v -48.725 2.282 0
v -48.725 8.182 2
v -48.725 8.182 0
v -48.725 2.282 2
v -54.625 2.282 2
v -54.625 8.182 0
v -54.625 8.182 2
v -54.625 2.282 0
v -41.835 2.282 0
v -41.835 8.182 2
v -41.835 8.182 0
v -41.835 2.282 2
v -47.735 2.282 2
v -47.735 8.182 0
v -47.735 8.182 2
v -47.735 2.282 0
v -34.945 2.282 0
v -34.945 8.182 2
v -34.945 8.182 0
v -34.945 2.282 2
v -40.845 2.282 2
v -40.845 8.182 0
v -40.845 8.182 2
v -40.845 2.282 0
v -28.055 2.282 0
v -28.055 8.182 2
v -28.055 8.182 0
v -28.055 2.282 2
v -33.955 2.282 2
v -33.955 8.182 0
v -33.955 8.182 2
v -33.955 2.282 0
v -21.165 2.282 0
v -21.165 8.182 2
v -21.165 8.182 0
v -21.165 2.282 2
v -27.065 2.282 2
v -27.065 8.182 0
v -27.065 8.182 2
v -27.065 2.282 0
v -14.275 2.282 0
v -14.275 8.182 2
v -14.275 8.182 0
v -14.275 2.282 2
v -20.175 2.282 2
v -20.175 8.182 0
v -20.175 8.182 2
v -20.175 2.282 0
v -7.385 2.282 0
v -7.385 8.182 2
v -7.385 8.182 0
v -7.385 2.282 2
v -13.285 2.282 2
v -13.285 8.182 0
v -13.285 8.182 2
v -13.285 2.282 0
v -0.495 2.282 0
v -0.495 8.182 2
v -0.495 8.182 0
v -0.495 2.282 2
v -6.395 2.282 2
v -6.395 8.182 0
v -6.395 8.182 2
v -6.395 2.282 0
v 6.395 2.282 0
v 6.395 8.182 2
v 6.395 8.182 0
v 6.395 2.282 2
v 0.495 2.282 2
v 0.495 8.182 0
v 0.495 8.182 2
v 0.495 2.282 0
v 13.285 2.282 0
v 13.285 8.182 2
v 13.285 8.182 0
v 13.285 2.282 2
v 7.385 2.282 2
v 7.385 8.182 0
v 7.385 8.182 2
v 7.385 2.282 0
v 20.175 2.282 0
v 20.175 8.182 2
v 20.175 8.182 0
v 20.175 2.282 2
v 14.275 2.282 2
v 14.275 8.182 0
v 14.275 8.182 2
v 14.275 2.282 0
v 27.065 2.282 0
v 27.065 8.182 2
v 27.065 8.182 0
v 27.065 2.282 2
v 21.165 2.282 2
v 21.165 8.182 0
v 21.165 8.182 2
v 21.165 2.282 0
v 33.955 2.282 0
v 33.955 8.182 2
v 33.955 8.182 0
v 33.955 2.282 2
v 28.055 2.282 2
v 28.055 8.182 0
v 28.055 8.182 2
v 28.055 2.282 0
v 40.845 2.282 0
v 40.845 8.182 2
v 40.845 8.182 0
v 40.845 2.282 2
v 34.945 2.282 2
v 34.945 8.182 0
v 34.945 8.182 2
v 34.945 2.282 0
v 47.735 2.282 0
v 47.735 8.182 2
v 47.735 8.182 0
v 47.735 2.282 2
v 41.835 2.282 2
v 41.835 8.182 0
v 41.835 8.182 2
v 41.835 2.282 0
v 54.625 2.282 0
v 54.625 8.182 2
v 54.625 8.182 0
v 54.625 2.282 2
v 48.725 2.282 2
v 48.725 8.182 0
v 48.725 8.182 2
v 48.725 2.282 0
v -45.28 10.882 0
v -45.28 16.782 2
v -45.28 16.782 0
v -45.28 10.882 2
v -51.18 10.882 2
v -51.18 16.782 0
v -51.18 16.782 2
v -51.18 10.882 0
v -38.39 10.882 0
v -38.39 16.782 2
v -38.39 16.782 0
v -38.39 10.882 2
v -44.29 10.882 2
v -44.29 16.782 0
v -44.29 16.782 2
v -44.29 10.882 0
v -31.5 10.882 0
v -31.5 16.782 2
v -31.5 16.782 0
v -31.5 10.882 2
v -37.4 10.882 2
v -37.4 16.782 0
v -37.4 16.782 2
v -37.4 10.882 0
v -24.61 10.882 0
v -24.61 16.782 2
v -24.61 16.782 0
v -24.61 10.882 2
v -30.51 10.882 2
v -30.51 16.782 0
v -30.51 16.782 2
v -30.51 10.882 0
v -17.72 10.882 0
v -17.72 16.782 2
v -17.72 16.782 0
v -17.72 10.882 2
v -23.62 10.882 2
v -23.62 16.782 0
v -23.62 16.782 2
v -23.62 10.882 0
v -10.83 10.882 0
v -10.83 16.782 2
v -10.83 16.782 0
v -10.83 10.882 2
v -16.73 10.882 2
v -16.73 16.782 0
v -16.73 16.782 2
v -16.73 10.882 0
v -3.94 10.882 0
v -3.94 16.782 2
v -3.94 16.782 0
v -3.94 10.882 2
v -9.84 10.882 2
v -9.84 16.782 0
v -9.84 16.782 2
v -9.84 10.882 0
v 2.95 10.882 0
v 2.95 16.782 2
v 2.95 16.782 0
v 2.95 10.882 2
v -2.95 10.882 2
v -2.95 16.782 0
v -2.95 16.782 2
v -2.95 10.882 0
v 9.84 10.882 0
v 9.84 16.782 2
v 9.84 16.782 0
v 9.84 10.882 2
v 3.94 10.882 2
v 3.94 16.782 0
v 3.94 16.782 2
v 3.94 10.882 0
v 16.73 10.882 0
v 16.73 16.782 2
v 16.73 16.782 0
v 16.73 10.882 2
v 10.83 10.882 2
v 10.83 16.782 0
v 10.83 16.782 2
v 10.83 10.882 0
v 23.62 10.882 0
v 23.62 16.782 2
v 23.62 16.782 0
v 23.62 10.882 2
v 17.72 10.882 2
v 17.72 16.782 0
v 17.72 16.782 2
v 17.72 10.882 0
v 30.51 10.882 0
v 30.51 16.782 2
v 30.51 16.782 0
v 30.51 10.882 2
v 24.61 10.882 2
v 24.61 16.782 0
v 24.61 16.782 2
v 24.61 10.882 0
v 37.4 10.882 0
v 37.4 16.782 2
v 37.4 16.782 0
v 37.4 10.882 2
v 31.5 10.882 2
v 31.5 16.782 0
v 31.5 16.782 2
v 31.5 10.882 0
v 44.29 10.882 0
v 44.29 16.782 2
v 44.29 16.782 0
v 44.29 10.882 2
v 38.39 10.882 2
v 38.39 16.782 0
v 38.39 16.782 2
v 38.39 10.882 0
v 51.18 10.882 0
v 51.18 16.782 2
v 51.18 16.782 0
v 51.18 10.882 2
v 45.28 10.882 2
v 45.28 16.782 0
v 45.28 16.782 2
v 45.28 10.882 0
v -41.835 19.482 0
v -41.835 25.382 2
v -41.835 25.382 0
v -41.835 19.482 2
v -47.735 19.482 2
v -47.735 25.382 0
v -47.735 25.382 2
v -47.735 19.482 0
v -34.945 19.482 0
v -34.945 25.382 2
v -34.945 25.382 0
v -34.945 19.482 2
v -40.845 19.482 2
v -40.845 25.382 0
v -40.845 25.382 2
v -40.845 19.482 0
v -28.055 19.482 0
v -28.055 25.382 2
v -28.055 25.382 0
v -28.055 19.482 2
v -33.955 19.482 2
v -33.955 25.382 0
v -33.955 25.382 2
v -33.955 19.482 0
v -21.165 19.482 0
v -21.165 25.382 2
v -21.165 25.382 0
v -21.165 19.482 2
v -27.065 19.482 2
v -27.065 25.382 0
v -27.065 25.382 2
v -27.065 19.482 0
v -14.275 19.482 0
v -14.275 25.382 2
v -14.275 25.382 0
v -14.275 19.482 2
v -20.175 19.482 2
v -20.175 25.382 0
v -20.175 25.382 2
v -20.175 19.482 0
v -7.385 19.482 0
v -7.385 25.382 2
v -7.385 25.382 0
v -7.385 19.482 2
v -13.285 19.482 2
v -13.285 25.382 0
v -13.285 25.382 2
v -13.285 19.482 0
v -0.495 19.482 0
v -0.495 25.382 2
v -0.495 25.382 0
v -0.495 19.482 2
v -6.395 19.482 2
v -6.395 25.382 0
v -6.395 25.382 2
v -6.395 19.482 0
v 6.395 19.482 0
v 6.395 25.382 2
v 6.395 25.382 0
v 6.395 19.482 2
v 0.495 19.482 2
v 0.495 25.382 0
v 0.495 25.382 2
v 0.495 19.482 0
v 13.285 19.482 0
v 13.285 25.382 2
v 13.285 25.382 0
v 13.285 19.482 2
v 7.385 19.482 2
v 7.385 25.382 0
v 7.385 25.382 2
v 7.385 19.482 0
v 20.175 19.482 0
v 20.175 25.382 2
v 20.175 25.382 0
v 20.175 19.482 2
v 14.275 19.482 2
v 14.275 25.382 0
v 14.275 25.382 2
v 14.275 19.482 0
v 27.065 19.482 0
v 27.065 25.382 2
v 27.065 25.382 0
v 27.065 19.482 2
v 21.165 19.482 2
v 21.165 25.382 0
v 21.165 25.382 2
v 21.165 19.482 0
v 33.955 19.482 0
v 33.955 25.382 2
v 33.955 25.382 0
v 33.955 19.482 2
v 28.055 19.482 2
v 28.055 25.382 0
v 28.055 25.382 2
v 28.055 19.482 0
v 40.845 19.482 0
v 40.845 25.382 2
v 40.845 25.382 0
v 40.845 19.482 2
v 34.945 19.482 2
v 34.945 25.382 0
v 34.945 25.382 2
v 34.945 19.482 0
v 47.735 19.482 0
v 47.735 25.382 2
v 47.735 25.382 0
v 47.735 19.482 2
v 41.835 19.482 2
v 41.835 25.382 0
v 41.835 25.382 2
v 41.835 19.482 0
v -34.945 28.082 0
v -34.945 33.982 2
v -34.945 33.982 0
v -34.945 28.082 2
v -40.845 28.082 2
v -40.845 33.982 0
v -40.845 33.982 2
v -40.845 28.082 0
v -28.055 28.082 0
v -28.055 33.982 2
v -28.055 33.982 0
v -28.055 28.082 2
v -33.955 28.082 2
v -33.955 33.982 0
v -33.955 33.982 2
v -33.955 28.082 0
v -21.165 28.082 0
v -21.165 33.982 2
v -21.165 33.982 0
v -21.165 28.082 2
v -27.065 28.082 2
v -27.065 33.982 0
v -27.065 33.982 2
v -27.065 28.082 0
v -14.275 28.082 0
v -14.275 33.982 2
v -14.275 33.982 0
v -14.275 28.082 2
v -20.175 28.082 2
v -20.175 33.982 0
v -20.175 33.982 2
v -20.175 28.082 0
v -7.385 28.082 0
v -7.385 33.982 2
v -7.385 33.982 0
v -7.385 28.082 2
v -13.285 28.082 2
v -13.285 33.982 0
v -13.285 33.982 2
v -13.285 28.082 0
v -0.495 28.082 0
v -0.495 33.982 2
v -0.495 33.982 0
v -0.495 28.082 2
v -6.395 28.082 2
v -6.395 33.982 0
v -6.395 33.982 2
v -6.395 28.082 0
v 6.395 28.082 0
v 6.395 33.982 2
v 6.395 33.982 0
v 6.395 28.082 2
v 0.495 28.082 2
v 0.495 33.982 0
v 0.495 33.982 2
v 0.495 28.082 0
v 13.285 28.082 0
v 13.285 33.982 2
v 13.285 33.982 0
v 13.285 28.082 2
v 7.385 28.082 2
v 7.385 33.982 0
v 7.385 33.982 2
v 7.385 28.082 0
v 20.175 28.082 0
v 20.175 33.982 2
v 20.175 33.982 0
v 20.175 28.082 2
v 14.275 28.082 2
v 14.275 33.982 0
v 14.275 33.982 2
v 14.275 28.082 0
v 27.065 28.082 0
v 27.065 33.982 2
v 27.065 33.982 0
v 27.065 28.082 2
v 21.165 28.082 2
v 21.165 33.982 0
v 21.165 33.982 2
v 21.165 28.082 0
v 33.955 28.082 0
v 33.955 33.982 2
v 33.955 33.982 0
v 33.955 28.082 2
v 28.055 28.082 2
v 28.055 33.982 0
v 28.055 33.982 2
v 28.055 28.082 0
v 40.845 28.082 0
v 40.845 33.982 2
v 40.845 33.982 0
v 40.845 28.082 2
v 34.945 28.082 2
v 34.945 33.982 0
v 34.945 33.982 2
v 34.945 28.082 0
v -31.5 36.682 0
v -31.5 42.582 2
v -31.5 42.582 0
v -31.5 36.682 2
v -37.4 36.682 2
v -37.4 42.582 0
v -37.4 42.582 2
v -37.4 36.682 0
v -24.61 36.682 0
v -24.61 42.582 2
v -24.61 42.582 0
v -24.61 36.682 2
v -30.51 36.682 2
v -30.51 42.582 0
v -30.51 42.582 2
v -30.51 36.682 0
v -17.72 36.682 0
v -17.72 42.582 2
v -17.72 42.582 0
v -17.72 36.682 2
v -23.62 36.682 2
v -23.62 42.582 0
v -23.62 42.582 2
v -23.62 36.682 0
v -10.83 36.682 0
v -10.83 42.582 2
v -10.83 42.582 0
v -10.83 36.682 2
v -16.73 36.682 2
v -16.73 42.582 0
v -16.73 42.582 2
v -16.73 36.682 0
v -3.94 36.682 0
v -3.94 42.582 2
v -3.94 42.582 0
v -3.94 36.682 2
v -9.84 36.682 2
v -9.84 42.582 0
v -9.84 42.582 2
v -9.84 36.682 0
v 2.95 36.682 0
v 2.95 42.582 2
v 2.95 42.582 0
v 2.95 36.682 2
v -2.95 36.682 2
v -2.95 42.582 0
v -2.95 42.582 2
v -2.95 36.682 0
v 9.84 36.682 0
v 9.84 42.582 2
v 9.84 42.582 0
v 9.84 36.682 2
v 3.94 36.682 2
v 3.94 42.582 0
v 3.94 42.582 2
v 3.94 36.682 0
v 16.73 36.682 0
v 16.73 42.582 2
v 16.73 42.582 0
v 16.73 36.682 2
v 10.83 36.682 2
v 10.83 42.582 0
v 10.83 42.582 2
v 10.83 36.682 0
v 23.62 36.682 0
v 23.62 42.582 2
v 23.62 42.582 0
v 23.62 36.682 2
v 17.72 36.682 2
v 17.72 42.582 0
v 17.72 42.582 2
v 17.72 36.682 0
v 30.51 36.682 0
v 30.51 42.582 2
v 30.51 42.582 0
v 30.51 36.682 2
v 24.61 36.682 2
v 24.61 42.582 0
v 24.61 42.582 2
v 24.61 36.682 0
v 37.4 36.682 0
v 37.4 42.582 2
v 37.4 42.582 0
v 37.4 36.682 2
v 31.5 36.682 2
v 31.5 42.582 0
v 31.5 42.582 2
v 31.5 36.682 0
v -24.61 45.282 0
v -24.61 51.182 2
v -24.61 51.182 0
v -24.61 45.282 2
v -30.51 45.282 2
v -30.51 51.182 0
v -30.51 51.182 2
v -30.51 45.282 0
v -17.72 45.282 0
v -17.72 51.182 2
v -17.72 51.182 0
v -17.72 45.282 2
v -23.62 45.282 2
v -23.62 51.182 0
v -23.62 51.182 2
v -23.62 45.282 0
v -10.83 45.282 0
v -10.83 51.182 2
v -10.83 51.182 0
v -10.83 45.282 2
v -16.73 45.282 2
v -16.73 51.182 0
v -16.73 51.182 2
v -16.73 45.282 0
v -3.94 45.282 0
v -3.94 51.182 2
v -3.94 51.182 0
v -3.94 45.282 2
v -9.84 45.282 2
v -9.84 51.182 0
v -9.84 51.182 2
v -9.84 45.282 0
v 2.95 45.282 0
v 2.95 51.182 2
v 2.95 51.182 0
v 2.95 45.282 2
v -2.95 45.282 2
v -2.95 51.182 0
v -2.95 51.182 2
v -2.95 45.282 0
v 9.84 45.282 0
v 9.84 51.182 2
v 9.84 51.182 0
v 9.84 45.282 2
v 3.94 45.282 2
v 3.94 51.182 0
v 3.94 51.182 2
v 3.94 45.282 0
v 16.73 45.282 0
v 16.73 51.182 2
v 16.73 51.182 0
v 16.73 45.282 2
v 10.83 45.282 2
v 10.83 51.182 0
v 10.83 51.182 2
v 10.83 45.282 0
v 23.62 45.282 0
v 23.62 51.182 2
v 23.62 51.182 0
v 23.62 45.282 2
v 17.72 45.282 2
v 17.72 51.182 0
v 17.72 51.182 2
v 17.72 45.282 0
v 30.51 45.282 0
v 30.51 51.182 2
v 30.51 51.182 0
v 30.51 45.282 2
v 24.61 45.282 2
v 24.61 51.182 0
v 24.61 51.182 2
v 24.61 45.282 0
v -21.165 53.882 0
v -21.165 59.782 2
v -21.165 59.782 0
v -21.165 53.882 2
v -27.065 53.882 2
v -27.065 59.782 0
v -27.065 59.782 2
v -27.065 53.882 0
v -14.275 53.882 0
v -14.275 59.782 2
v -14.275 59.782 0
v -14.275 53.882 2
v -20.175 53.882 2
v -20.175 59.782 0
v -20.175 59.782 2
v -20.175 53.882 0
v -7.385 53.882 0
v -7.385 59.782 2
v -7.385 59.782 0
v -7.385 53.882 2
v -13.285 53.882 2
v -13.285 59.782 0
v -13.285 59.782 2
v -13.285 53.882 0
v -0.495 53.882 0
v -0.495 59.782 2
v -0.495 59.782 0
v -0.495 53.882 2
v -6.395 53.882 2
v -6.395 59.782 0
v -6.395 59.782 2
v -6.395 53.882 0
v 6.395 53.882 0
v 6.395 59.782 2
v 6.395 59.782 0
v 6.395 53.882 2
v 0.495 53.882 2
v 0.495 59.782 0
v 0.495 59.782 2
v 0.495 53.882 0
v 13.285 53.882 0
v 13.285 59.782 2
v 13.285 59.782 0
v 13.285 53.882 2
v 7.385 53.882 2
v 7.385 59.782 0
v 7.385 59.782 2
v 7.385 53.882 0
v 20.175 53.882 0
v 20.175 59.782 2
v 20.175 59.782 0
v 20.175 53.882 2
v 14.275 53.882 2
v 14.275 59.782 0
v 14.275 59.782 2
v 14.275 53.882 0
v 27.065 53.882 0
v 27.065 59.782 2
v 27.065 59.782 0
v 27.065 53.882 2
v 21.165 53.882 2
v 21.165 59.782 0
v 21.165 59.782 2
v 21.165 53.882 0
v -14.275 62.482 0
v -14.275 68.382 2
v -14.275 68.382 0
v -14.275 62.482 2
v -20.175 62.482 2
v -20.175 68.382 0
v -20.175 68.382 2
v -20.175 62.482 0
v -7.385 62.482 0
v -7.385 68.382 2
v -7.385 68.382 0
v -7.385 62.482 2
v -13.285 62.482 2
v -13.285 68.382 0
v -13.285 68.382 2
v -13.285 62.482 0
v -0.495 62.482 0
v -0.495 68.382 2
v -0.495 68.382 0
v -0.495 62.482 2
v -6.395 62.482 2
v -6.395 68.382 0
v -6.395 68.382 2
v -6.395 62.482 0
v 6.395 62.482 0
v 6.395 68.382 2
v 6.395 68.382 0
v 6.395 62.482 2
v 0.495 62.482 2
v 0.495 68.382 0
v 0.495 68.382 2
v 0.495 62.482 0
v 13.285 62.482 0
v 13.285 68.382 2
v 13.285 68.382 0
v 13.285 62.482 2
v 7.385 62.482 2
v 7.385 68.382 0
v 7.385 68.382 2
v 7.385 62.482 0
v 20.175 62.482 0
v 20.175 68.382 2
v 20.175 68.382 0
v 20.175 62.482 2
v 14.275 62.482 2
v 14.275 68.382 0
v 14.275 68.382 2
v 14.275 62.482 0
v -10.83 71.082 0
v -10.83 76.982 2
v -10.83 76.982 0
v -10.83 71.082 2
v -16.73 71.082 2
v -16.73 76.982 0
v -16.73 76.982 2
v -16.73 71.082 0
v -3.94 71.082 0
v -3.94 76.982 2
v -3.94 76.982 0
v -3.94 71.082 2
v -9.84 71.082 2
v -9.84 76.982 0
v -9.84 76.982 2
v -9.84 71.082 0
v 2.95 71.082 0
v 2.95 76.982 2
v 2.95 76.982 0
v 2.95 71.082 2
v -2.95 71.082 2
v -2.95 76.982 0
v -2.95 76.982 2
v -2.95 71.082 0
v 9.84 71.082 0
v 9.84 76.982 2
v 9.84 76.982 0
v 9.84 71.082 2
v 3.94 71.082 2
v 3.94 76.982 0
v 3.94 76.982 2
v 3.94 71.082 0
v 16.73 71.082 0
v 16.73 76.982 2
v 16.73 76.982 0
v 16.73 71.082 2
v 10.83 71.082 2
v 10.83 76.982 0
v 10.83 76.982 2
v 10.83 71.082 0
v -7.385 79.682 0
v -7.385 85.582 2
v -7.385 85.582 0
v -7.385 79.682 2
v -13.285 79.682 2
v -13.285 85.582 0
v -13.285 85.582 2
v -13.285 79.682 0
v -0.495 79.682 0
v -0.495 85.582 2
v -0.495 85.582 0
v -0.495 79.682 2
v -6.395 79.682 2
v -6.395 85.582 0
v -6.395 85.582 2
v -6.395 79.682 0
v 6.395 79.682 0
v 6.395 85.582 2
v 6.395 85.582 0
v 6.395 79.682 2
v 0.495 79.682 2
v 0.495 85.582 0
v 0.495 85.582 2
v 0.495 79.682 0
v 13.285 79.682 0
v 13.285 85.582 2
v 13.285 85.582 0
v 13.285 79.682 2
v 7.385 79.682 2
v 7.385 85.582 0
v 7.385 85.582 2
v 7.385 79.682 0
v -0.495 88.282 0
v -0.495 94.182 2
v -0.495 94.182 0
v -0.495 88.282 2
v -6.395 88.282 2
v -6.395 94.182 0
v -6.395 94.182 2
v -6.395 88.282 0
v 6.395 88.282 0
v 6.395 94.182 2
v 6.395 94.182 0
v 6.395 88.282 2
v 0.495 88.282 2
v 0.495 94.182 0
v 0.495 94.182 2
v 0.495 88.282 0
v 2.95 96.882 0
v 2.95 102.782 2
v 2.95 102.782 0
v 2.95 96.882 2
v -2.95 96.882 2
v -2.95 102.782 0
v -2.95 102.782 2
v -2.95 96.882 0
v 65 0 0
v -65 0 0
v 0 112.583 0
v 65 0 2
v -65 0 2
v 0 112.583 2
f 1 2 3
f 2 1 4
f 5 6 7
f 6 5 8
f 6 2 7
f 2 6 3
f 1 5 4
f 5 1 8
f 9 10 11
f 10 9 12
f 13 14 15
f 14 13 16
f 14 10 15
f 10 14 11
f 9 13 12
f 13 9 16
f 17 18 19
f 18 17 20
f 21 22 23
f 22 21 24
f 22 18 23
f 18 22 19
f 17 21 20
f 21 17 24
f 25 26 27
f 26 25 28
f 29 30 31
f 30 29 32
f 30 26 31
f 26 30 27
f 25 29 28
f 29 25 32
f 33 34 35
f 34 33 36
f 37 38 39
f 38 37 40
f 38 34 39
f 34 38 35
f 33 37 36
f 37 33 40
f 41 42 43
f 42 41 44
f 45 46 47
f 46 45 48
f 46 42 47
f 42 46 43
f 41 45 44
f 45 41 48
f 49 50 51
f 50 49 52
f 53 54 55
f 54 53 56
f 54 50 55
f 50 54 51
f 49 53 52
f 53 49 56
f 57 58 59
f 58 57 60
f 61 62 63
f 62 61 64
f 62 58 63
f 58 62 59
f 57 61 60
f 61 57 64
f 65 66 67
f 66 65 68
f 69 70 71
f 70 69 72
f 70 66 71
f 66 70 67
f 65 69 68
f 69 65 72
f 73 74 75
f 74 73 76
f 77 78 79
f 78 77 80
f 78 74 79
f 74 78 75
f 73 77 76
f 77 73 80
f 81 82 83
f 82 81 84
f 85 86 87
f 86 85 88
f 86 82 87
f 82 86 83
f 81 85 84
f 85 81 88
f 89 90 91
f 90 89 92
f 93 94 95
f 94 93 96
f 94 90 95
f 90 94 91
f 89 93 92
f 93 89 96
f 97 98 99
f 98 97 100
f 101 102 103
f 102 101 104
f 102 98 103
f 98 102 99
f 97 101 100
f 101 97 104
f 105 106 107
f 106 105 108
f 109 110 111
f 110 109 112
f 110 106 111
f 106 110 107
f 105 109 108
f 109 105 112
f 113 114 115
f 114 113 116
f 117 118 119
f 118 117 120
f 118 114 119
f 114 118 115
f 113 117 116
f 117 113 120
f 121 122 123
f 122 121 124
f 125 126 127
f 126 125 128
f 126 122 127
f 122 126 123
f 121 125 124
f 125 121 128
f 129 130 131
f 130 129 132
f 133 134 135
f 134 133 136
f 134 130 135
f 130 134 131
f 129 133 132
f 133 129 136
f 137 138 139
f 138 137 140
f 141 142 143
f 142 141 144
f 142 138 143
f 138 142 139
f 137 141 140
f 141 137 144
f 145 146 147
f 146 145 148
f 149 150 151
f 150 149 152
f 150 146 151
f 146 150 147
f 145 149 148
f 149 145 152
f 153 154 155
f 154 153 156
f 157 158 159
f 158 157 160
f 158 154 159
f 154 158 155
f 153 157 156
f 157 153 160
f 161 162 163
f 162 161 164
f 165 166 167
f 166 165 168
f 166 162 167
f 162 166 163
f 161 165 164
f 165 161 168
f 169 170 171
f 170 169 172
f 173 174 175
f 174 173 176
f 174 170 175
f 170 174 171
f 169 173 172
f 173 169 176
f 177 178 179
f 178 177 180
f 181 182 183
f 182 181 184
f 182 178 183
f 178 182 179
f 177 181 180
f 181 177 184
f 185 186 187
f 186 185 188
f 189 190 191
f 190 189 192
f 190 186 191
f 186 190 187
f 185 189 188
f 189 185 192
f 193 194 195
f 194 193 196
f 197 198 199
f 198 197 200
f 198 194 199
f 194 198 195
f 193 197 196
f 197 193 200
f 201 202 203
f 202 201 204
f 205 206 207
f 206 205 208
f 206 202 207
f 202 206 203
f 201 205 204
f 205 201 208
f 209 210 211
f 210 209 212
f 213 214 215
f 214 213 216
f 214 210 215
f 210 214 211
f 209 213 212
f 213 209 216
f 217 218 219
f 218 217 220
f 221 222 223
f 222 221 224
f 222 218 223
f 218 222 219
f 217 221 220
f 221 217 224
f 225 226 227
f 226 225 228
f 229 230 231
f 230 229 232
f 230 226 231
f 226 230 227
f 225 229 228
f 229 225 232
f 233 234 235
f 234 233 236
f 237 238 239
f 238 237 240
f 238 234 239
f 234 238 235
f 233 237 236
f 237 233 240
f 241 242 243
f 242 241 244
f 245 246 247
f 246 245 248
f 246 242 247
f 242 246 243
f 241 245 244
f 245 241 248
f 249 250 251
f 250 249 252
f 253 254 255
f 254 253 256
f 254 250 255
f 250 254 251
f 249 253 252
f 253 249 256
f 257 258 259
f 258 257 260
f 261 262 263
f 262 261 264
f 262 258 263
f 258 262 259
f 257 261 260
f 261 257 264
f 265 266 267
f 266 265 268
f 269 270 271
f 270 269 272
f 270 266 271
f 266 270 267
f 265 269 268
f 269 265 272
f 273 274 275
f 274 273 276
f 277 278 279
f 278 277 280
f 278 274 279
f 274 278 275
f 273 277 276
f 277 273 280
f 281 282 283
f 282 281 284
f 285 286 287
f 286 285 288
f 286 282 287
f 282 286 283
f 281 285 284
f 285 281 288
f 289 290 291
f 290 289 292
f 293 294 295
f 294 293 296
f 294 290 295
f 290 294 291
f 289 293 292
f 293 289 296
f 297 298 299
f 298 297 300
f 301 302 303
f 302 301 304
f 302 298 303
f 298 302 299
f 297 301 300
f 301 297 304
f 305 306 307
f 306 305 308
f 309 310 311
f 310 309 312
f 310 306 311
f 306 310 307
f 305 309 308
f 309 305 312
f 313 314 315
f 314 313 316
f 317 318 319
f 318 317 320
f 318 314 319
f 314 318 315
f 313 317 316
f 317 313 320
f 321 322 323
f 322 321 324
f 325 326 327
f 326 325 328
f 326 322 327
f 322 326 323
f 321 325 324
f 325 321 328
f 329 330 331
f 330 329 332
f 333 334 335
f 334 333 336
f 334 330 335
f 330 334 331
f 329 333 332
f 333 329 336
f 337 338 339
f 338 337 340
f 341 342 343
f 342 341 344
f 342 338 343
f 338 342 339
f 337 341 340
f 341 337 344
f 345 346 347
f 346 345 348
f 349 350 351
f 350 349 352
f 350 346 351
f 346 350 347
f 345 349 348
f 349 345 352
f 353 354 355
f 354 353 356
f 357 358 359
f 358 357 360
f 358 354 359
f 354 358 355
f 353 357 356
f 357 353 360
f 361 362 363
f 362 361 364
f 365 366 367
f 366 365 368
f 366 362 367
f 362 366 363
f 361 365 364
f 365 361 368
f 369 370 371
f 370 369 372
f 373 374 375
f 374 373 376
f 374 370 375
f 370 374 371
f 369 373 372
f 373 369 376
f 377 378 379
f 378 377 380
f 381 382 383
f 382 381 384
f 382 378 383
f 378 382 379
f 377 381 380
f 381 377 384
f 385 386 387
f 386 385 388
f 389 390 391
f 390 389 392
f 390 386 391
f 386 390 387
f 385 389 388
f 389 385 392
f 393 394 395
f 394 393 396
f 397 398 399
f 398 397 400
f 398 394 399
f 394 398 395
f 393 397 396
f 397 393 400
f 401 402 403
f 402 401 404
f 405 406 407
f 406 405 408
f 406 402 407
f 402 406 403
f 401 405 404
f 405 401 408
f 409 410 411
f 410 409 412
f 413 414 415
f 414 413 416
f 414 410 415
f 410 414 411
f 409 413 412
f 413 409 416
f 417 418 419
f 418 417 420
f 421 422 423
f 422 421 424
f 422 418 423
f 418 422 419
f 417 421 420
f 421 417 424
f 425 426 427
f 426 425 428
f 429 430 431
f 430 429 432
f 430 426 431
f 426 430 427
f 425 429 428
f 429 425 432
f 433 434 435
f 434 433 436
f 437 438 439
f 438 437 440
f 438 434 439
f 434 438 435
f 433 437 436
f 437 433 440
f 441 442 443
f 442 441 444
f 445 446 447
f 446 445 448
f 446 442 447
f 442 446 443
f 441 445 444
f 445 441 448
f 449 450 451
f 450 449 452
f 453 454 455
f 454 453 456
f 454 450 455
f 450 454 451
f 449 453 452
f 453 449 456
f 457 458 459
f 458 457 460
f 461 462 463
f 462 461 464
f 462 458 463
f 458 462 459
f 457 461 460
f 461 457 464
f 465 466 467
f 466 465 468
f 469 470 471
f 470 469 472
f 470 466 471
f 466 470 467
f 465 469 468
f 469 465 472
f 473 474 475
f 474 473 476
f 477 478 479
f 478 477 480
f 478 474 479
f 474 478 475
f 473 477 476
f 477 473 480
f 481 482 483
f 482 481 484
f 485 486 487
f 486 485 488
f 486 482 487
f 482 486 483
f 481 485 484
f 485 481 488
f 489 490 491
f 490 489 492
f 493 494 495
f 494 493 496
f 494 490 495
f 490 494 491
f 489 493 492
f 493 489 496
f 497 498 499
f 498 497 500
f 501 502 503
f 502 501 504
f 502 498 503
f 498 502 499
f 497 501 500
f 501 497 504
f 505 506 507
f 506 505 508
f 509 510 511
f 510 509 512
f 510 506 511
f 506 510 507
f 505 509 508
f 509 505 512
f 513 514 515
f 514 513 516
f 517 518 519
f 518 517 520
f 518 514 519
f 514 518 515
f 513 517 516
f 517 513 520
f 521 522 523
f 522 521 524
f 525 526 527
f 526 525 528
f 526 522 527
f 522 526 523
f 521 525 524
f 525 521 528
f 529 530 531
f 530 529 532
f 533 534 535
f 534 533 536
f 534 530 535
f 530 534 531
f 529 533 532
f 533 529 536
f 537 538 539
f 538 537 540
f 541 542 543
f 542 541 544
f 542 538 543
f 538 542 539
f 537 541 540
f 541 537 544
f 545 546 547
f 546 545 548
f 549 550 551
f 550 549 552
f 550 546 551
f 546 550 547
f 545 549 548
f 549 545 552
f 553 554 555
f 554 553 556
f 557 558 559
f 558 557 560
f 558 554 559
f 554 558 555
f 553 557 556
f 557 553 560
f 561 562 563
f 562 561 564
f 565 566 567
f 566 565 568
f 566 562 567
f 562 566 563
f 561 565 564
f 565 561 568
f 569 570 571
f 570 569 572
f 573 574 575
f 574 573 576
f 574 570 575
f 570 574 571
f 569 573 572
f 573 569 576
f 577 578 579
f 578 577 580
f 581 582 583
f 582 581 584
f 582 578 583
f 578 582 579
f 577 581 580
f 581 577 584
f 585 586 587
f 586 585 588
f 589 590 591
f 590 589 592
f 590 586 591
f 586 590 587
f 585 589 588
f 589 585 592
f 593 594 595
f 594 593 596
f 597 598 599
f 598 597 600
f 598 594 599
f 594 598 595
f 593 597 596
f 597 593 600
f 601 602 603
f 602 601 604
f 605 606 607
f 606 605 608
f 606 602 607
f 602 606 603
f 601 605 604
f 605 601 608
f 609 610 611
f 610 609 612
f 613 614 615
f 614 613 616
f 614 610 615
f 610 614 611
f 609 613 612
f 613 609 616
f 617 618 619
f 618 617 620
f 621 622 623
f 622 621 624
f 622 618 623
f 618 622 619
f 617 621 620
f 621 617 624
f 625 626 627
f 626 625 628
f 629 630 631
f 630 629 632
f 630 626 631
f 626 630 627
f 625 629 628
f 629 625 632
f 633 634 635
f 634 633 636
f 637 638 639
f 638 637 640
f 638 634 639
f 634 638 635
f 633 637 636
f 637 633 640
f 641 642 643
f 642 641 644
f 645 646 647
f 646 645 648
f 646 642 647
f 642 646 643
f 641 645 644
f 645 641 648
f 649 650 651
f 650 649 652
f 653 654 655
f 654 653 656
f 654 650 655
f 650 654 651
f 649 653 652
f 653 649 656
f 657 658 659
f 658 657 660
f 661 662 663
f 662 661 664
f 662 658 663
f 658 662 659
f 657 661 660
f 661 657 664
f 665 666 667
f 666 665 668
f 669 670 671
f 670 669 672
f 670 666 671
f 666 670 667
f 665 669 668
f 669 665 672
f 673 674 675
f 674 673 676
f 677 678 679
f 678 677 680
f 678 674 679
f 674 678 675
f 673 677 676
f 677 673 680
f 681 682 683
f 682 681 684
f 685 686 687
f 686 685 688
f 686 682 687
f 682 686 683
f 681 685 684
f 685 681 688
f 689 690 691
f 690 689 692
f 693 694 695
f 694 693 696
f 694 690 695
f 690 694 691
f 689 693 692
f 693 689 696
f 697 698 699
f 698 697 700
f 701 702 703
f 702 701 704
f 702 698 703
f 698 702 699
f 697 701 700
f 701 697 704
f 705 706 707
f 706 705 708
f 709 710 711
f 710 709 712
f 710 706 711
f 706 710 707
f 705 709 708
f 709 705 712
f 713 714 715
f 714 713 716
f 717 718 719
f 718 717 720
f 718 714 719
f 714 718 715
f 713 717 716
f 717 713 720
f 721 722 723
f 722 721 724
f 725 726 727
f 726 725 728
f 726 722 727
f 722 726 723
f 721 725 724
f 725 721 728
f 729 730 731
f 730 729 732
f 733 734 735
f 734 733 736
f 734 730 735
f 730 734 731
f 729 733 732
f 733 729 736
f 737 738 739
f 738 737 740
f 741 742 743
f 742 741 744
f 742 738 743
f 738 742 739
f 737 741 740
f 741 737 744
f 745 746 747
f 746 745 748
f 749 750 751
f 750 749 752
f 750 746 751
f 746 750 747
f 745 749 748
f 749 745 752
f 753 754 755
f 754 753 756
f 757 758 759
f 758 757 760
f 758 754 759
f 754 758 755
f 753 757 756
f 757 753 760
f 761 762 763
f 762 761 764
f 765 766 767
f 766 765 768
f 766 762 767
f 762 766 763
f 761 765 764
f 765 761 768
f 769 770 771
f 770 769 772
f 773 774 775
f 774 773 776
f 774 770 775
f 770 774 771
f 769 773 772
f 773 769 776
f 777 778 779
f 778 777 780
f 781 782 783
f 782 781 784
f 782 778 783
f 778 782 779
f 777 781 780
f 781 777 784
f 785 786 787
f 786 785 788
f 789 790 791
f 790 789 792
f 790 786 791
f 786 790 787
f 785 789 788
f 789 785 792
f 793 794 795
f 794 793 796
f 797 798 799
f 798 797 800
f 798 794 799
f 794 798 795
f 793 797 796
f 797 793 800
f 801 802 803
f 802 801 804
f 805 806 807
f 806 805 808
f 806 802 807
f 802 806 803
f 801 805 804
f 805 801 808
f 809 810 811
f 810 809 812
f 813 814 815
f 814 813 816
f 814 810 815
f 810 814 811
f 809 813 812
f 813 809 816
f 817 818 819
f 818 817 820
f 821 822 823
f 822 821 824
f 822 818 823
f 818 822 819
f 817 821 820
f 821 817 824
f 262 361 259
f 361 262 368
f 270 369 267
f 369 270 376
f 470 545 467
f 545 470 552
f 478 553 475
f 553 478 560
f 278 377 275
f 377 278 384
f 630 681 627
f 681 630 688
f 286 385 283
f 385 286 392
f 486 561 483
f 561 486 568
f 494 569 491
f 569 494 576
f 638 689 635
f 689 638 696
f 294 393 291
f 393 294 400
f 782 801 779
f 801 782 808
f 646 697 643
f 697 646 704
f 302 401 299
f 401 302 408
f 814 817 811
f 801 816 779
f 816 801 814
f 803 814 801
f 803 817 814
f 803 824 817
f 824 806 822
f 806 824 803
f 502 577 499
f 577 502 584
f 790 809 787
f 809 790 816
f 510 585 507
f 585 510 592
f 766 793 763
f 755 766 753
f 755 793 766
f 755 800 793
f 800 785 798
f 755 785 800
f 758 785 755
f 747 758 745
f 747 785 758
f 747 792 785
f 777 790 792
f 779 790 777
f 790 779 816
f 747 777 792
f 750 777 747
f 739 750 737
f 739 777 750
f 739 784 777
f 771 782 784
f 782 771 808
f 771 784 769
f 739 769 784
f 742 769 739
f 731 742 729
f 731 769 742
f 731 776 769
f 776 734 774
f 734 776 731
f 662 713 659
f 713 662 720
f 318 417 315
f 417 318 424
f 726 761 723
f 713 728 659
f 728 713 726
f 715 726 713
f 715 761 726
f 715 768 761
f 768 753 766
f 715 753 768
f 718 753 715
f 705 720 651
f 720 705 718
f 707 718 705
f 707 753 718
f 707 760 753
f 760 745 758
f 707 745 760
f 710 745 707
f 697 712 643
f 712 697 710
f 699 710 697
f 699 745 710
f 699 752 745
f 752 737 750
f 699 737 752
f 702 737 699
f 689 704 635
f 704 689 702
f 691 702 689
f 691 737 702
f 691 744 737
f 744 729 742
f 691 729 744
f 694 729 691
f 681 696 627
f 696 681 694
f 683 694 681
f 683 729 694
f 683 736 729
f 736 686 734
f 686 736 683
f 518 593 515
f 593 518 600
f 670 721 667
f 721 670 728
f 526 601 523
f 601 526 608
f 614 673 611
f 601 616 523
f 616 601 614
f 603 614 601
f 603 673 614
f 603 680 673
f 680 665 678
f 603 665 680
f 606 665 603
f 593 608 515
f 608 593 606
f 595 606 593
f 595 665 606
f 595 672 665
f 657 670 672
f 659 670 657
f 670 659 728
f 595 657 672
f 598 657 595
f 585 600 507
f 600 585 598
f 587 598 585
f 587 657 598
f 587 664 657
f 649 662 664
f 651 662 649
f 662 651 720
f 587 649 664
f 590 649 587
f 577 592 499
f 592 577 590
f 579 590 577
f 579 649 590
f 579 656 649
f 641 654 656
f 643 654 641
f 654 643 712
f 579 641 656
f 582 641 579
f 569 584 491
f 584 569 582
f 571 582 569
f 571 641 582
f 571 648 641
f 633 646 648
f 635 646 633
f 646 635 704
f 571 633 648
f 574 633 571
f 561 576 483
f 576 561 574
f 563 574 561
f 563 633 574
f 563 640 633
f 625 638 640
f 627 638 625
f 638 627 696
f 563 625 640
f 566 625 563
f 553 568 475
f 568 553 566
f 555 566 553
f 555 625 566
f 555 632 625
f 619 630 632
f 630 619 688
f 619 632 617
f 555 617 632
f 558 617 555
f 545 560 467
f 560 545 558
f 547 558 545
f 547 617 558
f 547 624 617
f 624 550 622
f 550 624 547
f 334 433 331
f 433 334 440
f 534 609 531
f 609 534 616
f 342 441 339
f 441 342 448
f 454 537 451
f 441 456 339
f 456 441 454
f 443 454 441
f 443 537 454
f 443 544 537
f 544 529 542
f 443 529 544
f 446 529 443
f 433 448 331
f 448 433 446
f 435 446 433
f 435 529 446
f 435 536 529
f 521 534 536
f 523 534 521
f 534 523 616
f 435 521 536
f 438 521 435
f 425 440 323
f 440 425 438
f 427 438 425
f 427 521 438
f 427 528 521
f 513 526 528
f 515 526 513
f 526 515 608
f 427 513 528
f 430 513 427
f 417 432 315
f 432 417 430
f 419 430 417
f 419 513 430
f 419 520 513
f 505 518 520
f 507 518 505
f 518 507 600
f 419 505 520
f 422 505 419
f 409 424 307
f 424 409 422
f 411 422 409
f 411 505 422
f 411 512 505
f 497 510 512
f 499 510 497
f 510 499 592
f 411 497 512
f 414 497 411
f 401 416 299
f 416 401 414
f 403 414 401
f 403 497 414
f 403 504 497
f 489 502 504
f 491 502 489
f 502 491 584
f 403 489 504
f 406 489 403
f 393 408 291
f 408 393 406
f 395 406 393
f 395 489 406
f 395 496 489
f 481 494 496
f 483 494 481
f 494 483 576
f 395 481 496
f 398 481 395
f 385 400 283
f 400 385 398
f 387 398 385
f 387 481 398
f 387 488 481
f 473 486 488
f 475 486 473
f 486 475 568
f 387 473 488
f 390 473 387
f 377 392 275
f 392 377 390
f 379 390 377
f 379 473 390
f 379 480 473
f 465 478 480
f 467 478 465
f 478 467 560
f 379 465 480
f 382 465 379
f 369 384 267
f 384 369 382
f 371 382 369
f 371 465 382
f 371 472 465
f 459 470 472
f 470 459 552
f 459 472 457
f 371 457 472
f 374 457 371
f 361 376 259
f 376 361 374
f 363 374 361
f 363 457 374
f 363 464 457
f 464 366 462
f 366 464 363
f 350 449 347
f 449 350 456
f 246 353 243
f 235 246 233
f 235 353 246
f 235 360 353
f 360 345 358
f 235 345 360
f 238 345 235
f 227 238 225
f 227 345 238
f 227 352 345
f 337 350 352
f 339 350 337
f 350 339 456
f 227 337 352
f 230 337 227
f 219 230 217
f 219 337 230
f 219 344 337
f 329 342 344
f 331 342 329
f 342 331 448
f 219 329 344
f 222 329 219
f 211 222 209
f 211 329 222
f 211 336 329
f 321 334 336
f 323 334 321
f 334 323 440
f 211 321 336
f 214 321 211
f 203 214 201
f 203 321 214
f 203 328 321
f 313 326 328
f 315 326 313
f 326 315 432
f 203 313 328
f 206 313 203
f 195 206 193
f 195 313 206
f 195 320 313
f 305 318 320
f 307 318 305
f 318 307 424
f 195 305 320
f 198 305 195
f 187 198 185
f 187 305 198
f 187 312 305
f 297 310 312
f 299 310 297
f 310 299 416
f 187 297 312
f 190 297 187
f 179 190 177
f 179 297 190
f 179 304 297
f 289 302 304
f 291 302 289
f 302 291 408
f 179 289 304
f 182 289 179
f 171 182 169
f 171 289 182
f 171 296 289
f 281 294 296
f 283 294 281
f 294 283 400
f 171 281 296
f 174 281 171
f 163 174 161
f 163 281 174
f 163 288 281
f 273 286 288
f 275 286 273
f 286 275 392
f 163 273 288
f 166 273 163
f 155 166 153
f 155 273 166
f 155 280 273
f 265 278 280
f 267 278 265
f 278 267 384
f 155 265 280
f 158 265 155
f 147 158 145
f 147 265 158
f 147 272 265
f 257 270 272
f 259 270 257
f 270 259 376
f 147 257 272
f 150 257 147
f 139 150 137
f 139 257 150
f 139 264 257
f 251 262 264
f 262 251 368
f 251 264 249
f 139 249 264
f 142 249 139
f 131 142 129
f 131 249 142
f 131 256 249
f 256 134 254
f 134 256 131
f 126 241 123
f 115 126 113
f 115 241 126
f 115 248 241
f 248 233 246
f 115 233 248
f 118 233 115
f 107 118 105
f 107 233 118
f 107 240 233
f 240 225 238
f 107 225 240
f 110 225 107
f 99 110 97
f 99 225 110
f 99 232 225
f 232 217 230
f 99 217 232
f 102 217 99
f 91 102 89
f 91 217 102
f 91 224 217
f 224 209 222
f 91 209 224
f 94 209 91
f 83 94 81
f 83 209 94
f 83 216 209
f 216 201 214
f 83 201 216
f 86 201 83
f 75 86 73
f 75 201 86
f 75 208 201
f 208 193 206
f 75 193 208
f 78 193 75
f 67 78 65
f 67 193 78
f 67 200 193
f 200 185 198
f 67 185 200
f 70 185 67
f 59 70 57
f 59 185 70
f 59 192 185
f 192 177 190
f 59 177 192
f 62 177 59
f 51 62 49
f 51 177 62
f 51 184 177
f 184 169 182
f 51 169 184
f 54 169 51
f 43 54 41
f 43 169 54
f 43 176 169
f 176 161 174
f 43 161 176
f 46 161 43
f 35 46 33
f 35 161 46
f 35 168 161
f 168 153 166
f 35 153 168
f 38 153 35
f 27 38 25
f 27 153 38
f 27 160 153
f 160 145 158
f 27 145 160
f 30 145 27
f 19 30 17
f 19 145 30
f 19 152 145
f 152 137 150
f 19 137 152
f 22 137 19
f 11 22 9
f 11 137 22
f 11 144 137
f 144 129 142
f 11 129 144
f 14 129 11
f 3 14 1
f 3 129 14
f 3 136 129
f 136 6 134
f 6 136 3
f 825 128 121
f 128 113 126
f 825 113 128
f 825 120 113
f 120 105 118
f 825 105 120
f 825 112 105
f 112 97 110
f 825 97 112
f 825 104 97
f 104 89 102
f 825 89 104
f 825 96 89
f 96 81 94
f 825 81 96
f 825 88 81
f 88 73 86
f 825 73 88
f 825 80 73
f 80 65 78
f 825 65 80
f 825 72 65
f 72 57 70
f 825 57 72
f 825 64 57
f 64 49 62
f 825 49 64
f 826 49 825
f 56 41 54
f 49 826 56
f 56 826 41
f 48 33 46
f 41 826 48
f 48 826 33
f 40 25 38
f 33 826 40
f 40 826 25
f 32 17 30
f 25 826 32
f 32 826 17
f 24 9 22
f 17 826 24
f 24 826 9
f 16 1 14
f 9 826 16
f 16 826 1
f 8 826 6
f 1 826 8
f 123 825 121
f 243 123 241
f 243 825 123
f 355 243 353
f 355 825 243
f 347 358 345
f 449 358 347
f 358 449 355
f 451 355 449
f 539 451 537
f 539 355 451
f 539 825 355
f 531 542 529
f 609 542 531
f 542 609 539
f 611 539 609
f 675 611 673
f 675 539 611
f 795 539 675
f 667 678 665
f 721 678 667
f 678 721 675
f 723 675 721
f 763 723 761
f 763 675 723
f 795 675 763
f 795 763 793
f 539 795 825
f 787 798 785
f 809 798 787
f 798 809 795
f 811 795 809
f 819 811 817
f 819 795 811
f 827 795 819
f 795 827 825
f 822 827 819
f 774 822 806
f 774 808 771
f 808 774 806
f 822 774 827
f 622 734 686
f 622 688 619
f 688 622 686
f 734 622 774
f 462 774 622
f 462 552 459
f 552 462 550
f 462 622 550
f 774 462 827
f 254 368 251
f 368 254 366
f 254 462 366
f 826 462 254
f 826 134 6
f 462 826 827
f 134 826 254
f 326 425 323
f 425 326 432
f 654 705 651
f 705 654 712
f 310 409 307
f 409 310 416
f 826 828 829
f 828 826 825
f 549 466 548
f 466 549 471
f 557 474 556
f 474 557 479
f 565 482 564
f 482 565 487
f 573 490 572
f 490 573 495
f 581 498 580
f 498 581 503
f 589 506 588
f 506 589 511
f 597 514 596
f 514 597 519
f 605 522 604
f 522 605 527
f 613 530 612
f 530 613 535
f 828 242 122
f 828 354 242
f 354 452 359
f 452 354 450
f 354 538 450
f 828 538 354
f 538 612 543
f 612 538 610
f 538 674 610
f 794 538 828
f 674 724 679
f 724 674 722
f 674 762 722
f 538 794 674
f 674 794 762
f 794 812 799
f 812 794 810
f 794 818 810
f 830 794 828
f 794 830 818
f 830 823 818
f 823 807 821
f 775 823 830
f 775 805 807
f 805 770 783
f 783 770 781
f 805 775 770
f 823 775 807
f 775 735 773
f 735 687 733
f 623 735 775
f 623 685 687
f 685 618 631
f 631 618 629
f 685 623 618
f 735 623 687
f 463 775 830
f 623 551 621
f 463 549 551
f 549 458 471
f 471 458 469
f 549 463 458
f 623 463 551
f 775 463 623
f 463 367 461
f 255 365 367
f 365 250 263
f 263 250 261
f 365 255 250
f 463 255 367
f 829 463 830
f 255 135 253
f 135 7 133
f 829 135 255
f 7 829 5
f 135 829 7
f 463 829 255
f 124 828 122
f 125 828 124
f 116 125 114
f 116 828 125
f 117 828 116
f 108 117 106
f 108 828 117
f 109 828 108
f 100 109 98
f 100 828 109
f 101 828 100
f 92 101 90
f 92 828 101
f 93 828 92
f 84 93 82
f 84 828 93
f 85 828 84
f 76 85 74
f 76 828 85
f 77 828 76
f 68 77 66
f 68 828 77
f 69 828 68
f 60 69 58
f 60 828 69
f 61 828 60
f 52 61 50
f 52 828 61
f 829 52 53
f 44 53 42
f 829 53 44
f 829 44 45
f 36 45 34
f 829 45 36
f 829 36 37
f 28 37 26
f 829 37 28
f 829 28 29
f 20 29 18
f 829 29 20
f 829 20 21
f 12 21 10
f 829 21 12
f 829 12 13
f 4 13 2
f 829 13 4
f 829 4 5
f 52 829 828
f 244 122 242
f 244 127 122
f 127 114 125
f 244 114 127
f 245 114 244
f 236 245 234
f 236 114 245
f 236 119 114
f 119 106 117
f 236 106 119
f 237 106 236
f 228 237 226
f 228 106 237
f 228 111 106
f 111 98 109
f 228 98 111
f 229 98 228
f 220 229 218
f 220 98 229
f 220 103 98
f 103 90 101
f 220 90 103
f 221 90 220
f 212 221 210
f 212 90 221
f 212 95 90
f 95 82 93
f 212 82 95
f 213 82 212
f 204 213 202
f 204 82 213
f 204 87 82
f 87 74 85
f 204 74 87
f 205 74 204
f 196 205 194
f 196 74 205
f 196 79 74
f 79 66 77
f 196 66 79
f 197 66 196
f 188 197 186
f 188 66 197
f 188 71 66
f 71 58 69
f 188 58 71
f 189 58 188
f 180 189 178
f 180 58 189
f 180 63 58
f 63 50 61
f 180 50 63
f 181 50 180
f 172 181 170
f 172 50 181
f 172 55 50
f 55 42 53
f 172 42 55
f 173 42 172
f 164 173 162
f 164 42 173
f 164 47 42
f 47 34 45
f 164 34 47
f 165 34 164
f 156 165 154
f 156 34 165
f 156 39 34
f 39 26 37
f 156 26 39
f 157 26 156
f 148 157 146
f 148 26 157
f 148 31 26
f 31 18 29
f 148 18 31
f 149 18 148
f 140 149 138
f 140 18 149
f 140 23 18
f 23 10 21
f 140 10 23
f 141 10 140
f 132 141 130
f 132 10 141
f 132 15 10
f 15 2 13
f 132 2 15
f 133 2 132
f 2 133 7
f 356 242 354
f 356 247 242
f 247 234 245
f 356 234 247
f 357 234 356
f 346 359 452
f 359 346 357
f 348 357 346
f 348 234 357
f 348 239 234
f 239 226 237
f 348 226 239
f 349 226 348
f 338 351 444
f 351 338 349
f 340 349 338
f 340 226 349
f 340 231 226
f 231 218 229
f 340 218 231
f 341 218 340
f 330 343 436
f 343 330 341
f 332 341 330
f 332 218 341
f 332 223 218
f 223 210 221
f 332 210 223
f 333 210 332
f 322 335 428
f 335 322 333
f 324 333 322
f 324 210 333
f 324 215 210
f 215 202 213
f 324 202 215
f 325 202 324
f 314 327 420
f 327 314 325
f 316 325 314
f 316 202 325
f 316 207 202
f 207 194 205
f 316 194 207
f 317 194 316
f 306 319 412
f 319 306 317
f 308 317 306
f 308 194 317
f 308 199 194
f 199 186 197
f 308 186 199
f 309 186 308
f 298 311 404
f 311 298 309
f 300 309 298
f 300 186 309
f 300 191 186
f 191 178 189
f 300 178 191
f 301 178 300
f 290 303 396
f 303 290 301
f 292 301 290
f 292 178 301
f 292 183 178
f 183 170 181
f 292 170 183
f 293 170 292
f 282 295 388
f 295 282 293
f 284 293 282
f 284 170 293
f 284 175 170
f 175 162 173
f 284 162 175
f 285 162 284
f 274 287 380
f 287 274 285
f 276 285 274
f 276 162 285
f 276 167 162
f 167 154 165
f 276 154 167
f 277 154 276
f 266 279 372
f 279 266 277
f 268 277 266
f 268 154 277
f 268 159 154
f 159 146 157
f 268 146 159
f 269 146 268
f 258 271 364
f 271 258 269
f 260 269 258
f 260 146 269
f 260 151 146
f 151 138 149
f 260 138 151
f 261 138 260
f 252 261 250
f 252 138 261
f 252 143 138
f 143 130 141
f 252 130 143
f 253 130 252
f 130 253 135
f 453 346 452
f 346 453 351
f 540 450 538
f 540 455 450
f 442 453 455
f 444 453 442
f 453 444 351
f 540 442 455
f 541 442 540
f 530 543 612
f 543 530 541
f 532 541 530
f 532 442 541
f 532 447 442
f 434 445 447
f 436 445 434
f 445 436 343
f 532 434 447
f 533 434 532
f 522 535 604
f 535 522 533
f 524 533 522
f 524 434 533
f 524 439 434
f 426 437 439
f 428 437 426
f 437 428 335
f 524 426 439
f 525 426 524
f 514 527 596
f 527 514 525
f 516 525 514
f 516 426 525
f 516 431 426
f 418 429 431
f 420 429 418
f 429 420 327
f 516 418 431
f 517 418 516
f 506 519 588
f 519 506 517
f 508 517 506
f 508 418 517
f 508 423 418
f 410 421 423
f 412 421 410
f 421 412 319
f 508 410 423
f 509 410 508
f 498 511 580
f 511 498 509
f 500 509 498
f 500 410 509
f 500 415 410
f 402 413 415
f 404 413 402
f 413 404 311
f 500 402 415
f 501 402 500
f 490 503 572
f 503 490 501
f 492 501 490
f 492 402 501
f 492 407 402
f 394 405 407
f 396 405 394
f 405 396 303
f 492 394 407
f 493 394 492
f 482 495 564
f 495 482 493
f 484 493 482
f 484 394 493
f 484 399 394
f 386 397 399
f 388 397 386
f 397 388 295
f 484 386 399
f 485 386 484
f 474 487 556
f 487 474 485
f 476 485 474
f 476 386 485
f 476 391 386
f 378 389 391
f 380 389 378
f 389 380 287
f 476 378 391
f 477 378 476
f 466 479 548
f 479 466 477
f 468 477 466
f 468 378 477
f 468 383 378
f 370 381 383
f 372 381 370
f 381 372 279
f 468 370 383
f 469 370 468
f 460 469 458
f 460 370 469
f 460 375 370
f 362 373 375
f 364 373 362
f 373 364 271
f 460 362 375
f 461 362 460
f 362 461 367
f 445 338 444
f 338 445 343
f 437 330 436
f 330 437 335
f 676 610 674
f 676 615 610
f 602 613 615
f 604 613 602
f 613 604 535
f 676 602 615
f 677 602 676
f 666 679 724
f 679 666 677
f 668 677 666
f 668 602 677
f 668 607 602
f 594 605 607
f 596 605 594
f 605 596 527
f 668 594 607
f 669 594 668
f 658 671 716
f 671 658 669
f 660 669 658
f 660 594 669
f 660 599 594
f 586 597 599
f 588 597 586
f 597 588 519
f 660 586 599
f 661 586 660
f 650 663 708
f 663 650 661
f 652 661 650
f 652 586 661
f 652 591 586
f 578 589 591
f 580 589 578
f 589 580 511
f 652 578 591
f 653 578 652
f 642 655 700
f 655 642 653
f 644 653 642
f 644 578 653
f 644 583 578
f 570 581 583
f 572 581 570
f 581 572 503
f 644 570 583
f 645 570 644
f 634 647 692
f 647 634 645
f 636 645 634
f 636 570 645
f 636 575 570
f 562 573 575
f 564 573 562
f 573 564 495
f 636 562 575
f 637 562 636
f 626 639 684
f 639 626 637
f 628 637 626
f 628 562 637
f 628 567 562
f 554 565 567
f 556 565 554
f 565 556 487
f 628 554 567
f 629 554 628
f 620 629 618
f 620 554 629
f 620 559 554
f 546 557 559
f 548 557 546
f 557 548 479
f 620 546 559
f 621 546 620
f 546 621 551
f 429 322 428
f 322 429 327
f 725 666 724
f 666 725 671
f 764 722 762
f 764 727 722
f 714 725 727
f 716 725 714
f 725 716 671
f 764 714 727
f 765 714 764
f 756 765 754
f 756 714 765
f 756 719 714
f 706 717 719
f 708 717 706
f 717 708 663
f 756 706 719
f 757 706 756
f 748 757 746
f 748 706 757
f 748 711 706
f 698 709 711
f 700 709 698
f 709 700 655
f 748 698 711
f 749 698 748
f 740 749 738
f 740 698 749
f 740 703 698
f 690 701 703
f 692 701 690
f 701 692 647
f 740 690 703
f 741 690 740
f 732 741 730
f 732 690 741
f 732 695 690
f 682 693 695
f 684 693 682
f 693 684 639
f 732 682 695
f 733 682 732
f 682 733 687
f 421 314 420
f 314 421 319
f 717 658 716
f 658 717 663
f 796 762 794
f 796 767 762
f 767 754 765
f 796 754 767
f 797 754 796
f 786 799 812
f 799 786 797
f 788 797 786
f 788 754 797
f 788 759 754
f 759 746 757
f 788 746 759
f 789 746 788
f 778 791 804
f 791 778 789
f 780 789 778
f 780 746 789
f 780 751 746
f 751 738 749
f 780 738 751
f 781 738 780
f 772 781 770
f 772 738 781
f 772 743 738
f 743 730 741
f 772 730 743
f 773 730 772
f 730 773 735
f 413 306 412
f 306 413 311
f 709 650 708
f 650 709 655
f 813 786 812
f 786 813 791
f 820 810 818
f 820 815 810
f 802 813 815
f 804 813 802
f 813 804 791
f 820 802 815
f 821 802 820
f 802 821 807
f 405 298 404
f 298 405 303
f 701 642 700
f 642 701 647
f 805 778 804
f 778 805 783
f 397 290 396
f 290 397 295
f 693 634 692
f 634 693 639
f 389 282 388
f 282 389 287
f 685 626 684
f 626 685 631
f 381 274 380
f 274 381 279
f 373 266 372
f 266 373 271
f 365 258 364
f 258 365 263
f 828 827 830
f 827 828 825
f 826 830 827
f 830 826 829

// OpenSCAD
// Triangle side
side=130;
height = sqrt(3)*side/2;
led_margin = 0.9;
led_w = 5 + led_margin;
led_h = led_w;
thickness = 0.01;
inter_x = 1.92 - led_margin;
led_spacing_x = 6.89;
led_spacing_y = 8.6;
margin_x = 1; // mininum length between a LED and the edge
margin_y = 1.5;

module triangle(){
     linear_extrude(height=2)
        polygon(points=[[-side/2,0], [side/2,0], [0,height], [-side/2,0]]);
}

module led(){
     color("red") cube([led_h,led_w,6], center=true);
}


module row(start_x, start_y, stop_x){
    nb_leds = floor((stop_x - start_x +inter_x)/(led_spacing_x));
    echo(nb_leds);
    horizontal_centering = (stop_x - start_x - (nb_leds-1) * led_spacing_x)/2;
    for (i=[0:nb_leds-1]) {
        start_x_tmp = start_x + i*led_spacing_x  + horizontal_centering;
        translate([start_x_tmp, start_y])
        led();
    }
}

module leds(){
    margin_top = ((led_w+margin_x*2) * tan(60))/2;
    nb_lines = floor((height-margin_top)/(led_spacing_y));
    // Vertical centering 
    start_y_nb_lines = nb_lines*(led_spacing_y);
    vertical_centering = height - start_y_nb_lines;
    for (i=[0:nb_lines-1]){
        start_y = i*(led_spacing_y) + (vertical_centering / nb_lines) +margin_y+led_h/2;
        start_x = start_y/tan(60) + margin_x - side/2 + led_w/2;
        stop_x = -start_y/tan(60) - margin_x + side/2 - led_w/2;
        row(start_x, start_y, stop_x);
    }
}


module face() {
    difference() {
        triangle();
        leds();
    }
}
face();
